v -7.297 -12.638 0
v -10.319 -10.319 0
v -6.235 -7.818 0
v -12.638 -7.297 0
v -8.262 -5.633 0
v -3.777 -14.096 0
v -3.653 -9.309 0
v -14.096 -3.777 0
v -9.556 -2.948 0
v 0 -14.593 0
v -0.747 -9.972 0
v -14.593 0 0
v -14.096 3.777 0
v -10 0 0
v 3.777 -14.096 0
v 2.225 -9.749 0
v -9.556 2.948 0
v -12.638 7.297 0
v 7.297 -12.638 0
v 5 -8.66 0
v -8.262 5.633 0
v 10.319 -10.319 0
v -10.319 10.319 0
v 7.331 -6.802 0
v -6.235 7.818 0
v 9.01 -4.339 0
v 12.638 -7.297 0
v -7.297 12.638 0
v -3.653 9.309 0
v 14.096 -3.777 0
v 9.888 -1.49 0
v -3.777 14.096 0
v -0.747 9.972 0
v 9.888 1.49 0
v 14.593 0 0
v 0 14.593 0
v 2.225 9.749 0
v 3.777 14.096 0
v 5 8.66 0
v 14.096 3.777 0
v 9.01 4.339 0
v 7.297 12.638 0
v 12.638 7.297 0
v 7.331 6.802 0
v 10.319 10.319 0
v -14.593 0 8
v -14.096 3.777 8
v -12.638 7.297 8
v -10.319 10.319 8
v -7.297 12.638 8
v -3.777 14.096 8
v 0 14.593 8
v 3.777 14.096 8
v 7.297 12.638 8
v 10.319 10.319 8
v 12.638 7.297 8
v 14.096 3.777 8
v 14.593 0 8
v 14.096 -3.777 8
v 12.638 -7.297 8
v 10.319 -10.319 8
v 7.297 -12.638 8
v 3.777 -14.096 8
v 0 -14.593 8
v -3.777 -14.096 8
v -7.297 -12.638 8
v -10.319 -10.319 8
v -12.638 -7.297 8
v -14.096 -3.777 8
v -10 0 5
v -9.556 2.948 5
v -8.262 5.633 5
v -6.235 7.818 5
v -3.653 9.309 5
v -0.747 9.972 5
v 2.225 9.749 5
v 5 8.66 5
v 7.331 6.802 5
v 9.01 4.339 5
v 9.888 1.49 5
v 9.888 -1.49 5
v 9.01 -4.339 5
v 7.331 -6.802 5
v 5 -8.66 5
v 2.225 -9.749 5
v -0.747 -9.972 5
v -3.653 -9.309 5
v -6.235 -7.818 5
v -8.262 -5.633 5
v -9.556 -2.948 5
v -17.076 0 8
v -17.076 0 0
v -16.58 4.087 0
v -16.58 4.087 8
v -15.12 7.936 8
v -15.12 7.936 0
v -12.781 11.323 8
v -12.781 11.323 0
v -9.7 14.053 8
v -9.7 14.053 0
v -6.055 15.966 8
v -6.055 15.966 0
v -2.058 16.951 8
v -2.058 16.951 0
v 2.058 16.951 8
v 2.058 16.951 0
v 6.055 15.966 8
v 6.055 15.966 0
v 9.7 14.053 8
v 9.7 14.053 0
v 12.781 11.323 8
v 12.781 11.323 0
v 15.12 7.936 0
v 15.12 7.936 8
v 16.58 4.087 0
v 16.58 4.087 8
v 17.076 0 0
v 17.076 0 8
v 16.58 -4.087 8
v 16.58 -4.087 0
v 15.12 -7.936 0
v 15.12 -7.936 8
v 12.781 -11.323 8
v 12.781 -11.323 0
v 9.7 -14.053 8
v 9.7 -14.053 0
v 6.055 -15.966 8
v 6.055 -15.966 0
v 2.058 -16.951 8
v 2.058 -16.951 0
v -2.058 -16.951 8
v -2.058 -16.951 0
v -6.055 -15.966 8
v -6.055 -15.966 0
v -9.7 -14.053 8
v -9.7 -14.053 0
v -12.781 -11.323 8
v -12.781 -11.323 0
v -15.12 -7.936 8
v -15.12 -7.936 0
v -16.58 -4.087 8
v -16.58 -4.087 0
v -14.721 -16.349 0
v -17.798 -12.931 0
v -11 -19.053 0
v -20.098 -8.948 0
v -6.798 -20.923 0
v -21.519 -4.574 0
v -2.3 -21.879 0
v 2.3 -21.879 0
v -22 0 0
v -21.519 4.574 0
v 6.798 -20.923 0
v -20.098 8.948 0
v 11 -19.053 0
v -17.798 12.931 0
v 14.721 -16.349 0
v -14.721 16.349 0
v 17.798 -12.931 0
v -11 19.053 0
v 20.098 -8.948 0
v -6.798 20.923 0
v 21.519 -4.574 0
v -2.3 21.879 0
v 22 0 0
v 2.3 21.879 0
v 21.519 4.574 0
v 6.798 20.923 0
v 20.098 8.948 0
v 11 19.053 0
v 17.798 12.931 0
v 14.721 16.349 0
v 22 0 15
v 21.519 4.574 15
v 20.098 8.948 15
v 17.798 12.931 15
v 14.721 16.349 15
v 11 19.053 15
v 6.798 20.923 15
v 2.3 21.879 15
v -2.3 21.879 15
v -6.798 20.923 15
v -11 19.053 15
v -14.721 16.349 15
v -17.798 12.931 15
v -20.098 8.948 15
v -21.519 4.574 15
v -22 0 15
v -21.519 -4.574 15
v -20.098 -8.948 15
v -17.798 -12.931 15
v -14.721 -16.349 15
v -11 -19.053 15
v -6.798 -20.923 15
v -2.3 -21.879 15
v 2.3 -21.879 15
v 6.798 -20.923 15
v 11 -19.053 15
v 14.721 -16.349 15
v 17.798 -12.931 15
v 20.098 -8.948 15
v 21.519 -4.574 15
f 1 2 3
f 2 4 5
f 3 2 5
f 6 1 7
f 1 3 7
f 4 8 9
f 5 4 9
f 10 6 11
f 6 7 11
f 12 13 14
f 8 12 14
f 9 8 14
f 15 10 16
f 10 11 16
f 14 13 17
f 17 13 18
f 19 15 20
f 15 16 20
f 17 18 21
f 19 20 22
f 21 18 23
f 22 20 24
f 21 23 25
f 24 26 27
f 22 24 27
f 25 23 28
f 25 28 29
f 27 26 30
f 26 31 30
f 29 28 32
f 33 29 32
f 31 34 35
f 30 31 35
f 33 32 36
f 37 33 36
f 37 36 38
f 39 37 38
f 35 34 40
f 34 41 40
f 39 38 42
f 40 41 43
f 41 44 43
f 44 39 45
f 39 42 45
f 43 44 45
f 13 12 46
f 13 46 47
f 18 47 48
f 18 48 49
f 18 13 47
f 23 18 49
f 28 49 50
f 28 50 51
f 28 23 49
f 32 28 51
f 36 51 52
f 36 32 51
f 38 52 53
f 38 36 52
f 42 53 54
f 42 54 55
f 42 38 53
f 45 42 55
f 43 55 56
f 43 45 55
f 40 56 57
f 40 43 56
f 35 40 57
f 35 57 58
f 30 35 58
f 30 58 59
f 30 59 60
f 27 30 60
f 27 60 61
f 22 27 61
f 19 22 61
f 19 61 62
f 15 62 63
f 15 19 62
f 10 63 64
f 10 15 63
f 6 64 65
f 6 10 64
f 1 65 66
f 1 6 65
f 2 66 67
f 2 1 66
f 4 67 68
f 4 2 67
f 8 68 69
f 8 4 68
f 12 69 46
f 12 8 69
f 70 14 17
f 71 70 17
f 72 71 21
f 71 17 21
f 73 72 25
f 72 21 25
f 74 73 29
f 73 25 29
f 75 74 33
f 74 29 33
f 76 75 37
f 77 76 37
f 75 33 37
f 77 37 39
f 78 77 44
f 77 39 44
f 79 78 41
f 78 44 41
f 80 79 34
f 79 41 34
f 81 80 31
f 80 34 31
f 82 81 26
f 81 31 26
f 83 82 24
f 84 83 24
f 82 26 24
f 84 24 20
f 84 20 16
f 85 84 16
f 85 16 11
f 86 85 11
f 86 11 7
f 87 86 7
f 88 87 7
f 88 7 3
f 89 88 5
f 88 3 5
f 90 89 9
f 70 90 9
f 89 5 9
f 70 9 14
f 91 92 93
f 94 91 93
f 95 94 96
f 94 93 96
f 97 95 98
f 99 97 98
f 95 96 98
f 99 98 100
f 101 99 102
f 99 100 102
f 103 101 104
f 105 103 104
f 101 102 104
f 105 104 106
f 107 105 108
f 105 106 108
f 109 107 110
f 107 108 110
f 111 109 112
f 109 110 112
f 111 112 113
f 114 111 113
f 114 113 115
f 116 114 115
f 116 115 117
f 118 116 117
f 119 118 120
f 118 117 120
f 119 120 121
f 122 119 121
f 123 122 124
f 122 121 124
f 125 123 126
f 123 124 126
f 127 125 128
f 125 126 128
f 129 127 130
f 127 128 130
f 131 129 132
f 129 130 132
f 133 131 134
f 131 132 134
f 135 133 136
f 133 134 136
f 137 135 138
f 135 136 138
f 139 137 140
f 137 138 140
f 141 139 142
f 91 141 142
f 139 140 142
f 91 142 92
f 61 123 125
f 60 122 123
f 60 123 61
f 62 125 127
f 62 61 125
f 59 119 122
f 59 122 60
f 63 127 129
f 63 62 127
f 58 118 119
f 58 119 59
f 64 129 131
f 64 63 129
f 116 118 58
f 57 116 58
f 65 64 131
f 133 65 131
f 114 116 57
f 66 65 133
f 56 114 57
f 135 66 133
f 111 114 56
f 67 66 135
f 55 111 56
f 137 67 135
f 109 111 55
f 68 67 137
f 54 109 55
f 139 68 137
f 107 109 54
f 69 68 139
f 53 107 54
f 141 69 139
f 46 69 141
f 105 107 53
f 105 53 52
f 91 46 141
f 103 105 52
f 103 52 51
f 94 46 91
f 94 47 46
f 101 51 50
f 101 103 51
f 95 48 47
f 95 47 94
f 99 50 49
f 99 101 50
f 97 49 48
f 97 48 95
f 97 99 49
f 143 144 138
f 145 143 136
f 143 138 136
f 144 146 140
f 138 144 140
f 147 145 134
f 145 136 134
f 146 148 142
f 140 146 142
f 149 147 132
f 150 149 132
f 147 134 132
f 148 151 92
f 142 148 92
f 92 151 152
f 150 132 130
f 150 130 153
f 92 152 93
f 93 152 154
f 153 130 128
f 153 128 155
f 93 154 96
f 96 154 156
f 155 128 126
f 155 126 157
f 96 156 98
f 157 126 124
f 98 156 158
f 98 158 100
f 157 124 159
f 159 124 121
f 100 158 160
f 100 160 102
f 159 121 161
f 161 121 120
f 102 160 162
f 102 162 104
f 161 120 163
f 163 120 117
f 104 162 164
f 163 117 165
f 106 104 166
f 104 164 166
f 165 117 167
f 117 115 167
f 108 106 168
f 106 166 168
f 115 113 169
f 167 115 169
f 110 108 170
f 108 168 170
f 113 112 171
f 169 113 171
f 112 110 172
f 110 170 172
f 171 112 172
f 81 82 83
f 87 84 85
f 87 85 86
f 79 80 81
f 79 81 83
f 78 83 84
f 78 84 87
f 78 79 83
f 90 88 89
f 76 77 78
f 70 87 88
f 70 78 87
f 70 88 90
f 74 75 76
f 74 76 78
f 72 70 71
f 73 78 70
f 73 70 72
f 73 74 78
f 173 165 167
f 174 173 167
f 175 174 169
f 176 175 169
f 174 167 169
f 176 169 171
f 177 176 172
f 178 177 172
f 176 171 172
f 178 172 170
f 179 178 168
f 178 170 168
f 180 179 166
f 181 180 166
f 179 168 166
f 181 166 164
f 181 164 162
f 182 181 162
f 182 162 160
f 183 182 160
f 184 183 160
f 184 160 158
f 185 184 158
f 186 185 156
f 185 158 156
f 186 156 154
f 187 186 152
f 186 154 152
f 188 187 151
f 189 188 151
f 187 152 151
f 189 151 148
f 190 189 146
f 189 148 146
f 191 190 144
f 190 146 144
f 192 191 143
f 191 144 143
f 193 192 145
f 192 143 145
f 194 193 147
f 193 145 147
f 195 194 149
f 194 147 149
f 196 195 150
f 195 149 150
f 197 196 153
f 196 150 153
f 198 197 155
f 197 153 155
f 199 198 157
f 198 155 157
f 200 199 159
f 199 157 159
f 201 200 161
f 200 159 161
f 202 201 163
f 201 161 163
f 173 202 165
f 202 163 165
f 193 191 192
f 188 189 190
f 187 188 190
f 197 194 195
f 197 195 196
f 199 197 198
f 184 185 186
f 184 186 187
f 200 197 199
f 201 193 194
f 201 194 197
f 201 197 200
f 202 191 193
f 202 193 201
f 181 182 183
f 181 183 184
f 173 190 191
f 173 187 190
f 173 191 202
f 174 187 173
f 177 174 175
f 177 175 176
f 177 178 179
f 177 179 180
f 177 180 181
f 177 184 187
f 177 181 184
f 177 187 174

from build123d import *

# Parameters (mm, degrees)
SKETCH1_R           = 22
BOSS_EXTRUDE1_DEPTH = 15
SKETCH2_R           = 10
CUT_EXTRUDE1_DEPTH  = 5
SKETCH3_R           = 17.075773731
SKETCH3_R_2         = 14.593062164
CUT_EXTRUDE2_DEPTH  = 8


with BuildPart() as part:
    # Sketch1 → Boss-Extrude1 (new body)
    with BuildSketch(Plane.XY):
        Circle(SKETCH1_R)
    extrude(amount=BOSS_EXTRUDE1_DEPTH)

    # Sketch2 → Cut-Extrude1 (cut)
    with BuildSketch(Plane(origin=(0, 0, 0), x_dir=(-1, 0, 0), z_dir=(0, 0, -1))):
        Circle(SKETCH2_R)
    extrude(amount=-CUT_EXTRUDE1_DEPTH, mode=Mode.SUBTRACT)

    # Sketch3 → Cut-Extrude2 (cut)
    with BuildSketch(Plane(origin=(0, 0, 0), x_dir=(-1, 0, 0), z_dir=(0, 0, -1))):
        Circle(SKETCH3_R)
        Circle(SKETCH3_R_2, mode=Mode.SUBTRACT)
    extrude(amount=-CUT_EXTRUDE2_DEPTH, mode=Mode.SUBTRACT)


solid = part.part
